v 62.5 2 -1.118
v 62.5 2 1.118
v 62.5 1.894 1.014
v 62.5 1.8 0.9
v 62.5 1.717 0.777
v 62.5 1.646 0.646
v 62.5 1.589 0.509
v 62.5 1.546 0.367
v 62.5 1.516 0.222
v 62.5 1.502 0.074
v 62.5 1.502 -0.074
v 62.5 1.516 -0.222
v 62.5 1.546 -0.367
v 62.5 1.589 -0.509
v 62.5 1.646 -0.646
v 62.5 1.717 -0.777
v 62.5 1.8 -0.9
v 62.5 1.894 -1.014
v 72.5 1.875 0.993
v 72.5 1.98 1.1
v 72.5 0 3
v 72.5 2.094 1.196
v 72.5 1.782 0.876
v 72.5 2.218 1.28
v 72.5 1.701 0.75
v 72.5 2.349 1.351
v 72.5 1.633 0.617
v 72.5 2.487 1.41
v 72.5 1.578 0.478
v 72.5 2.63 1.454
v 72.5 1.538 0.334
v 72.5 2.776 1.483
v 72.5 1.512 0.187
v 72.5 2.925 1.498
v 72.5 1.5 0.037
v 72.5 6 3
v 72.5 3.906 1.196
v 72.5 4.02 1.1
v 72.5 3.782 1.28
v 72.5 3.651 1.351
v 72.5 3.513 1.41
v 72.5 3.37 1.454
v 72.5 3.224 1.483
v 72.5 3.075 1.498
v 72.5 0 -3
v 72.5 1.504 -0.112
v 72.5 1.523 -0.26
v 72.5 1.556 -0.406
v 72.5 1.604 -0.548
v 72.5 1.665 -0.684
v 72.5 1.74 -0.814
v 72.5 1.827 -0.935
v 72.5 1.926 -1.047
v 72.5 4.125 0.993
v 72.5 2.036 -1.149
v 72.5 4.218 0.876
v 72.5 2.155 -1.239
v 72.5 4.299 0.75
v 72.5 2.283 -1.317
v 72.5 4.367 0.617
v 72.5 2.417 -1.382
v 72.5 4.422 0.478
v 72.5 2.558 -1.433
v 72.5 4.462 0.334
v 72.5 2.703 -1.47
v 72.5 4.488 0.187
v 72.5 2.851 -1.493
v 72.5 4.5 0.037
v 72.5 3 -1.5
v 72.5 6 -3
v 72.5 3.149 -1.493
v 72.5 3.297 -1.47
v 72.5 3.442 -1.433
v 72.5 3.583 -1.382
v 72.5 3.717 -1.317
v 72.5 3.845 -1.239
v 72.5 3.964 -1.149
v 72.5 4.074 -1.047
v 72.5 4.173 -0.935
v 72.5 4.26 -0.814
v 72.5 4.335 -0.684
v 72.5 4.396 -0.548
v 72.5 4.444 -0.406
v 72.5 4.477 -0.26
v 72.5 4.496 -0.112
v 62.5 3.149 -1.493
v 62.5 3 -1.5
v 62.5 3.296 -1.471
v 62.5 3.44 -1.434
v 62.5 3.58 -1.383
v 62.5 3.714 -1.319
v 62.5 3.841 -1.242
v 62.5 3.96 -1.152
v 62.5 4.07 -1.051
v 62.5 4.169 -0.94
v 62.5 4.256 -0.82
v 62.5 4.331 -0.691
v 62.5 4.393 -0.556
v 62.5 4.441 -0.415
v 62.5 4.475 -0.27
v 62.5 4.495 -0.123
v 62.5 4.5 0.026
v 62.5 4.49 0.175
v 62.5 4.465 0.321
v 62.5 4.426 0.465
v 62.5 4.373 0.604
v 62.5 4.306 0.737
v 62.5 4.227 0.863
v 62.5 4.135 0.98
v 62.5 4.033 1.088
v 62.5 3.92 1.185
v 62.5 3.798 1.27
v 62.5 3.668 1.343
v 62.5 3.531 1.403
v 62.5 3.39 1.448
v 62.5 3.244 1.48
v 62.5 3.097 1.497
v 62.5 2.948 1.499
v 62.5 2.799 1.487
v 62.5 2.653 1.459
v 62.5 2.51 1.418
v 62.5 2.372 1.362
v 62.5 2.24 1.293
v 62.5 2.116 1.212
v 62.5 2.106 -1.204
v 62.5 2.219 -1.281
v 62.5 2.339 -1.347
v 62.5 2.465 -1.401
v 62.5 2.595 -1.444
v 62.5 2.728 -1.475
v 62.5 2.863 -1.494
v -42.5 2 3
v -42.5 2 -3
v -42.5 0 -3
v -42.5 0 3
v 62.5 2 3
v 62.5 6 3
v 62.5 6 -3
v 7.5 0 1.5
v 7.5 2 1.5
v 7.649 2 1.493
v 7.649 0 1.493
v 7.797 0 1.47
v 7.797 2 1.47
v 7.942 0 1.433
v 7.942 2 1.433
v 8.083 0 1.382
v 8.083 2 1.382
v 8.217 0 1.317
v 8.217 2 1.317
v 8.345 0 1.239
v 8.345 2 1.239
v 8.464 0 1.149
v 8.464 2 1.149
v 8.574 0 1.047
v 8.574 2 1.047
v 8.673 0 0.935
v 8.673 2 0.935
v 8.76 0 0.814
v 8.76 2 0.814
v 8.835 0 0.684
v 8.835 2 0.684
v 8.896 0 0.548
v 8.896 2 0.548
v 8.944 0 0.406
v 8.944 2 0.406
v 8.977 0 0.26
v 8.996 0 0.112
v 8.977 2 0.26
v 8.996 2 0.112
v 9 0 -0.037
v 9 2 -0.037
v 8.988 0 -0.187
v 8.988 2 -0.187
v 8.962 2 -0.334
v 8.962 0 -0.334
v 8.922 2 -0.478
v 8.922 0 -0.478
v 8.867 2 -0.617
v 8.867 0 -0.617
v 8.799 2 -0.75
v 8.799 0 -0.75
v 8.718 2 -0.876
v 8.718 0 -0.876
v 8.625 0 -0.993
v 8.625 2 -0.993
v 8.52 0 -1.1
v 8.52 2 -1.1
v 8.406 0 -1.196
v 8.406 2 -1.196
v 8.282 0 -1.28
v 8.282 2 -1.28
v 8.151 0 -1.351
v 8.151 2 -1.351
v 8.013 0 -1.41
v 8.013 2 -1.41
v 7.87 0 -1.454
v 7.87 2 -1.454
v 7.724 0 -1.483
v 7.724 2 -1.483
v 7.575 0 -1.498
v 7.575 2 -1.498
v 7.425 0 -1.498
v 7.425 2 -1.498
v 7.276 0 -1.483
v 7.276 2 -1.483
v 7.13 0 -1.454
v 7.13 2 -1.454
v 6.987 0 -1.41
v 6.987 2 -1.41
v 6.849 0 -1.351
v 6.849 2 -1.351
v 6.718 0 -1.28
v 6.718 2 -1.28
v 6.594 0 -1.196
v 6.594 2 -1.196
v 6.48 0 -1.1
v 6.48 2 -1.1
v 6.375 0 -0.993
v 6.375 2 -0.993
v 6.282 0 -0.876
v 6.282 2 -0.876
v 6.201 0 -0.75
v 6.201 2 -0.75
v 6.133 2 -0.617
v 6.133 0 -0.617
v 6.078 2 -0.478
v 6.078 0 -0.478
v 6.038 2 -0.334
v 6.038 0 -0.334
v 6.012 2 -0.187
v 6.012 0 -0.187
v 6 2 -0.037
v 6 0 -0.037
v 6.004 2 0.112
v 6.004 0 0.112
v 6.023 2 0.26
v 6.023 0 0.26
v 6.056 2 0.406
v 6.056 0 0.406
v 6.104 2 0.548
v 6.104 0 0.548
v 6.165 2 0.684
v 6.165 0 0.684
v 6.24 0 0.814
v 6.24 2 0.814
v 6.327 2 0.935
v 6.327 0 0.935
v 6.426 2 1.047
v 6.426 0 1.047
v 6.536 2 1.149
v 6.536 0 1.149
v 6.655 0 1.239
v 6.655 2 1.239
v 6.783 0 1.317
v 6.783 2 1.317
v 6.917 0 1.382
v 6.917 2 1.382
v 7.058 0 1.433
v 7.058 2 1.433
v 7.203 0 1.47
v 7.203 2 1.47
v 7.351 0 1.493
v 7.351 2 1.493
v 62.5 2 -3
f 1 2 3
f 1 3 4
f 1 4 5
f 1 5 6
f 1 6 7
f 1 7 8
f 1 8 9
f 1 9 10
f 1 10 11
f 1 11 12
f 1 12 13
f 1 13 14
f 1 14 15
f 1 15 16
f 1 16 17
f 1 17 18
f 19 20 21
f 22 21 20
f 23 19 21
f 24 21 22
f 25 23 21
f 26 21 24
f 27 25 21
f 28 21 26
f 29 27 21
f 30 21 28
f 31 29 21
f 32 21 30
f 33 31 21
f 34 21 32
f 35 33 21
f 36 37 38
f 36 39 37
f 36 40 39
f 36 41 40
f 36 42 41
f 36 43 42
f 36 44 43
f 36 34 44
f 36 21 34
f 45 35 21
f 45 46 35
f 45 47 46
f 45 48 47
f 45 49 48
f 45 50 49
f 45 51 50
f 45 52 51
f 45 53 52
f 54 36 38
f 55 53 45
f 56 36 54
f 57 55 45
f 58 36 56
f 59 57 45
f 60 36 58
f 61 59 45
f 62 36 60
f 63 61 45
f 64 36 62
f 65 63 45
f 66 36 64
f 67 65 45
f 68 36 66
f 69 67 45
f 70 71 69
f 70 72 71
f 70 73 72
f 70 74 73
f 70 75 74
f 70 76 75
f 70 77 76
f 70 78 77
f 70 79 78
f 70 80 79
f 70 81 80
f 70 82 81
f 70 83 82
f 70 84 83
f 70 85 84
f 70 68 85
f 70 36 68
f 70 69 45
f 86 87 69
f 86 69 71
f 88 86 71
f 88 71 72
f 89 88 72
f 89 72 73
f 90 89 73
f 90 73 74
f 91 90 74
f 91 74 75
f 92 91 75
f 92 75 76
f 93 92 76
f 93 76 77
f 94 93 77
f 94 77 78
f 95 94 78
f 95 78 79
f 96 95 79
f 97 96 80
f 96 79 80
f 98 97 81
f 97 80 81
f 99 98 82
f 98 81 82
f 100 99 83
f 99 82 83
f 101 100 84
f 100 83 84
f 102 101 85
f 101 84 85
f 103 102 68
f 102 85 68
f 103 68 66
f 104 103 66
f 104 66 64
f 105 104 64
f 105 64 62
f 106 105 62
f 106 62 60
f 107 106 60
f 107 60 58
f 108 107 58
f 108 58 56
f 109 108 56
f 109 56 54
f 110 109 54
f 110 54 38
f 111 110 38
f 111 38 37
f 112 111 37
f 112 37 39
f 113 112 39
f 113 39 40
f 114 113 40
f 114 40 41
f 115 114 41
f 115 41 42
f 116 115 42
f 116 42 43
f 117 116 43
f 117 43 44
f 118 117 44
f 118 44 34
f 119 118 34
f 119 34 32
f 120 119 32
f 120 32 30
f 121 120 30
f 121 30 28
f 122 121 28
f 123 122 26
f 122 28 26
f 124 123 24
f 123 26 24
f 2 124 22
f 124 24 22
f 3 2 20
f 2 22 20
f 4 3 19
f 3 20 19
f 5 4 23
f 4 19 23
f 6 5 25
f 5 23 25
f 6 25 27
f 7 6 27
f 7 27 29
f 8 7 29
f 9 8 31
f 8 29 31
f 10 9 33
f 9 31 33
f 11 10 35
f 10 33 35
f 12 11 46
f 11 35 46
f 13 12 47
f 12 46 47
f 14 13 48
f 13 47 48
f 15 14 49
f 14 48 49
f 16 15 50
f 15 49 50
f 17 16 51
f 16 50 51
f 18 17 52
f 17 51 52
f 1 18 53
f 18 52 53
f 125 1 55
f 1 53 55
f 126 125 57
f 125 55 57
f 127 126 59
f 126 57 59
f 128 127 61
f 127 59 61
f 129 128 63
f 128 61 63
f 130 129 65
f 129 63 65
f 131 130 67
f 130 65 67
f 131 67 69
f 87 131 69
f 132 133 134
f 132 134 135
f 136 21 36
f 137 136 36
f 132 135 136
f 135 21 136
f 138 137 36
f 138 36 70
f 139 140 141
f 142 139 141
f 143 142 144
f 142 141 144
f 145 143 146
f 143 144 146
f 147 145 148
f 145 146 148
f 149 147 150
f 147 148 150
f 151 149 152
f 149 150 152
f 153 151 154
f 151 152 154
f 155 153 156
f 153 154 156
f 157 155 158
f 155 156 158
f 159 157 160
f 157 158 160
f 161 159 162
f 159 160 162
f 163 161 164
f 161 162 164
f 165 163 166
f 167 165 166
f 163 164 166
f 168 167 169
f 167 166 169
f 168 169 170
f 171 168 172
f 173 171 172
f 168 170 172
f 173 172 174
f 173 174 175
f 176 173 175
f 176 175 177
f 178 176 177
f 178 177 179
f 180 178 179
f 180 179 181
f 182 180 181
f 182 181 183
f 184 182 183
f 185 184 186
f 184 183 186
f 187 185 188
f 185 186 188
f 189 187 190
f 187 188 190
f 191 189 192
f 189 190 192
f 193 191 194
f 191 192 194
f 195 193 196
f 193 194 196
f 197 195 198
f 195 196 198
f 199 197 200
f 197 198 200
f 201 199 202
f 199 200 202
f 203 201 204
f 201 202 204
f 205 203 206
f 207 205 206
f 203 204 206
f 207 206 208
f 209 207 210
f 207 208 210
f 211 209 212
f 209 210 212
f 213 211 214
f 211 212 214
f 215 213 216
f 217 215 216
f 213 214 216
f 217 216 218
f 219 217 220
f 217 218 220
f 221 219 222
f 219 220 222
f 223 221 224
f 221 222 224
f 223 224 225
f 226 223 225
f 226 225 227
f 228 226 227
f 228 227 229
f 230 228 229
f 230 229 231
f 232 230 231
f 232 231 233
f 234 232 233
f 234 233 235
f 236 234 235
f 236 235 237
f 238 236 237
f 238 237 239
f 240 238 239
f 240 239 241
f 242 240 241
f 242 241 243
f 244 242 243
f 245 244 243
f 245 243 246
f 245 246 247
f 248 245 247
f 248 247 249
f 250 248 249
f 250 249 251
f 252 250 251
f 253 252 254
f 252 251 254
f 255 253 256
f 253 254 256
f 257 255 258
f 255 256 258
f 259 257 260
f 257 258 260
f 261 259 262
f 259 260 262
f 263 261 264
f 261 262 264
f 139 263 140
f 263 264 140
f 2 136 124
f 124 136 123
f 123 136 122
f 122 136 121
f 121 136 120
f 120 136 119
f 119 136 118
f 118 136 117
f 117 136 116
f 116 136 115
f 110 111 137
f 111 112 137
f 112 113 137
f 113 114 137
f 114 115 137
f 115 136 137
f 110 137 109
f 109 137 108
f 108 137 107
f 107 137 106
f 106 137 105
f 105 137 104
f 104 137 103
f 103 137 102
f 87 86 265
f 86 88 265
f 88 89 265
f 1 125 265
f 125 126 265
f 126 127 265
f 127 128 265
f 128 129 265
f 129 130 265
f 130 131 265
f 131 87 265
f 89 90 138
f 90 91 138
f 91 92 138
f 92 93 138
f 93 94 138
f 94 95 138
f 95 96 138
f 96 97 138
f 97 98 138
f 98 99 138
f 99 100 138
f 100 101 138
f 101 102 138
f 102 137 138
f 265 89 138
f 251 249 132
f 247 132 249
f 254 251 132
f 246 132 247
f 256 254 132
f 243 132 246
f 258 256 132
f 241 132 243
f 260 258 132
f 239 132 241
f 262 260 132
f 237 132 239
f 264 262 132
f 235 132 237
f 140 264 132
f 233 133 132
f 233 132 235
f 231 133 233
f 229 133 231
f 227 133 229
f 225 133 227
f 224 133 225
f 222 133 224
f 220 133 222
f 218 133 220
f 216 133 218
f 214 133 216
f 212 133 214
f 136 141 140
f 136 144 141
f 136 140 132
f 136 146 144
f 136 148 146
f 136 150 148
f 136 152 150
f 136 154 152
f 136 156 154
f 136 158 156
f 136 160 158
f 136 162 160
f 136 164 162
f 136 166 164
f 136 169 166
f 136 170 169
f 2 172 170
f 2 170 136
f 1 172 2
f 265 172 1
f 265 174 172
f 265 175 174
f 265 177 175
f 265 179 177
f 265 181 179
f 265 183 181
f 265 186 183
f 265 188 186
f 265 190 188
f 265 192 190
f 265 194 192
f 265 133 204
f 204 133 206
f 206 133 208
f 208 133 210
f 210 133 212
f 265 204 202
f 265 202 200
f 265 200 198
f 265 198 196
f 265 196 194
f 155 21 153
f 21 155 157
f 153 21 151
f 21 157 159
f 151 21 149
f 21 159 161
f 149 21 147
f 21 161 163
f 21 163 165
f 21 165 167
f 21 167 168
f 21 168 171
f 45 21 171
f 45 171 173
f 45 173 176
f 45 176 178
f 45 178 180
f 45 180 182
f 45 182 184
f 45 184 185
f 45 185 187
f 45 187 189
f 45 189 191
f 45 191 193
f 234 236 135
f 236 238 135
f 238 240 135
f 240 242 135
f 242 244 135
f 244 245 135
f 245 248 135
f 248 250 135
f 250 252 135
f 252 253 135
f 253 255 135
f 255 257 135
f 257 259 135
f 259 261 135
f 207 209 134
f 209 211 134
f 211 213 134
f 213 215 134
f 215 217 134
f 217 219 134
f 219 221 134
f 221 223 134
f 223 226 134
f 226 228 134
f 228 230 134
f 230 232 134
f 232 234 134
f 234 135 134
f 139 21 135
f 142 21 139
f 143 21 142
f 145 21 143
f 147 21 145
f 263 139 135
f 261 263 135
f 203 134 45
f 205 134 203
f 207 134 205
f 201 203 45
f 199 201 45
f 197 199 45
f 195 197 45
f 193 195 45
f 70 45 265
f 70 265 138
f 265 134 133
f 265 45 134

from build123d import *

# Parameters (mm, degrees)
SKETCH1_W           = 125
SKETCH1_H           = 6
BOSS_EXTRUDE1_DEPTH = 4
SKETCH2_R           = 1.15
CUT_EXTRUDE1_DEPTH  = 4
SKETCH4_W           = 6
SKETCH4_H           = 6
BOSS_EXTRUDE2_DEPTH = 10
SKETCH5_R           = 1.25
CUT_EXTRUDE2_DEPTH  = 10
SKETCH6_W           = 125
SKETCH6_H           = 6
CUT_EXTRUDE3_DEPTH  = 2
SKETCH7_R           = 1.5
CUT_EXTRUDE5_DEPTH  = 2
SKETCH8_R           = 1.5
CUT_EXTRUDE6_DEPTH  = 10
SKETCH9_R           = 1.5
CUT_EXTRUDE7_DEPTH  = 10
SKETCH10_W          = 6
SKETCH10_H          = 2
CUT_EXTRUDE8_DEPTH  = 20
SKETCH11_R          = 1.5
BOSS_EXTRUDE3_DEPTH = 2
SKETCH12_R          = 1.5
CUT_EXTRUDE9_DEPTH  = 2


with BuildPart() as part:
    # Sketch1 → Boss-Extrude1 (new body)
    with BuildSketch(Plane(origin=(0, 0, 0), x_dir=(1, 0, 0), z_dir=(0, 1, 0))):
        Rectangle(SKETCH1_W, SKETCH1_H)
    extrude(amount=BOSS_EXTRUDE1_DEPTH)

    # Sketch2 → Cut-Extrude1 (cut)
    with BuildSketch(Plane.XZ):
        with Locations(Location((0, 0, 0), (0, 0, 270))):
            Circle(SKETCH2_R)
    extrude(amount=-CUT_EXTRUDE1_DEPTH, mode=Mode.SUBTRACT)

    # Sketch4 → Boss-Extrude2 (add)
    with BuildSketch(Plane(origin=(62.5, 0, 0), x_dir=(0, 0, -1), z_dir=(1, 0, 0))):
        with Locations((0, 3)):
            Rectangle(SKETCH4_W, SKETCH4_H)
    extrude(amount=BOSS_EXTRUDE2_DEPTH)

    # Sketch5 → Cut-Extrude2 (cut)
    with BuildSketch(Plane(origin=(72.5, 0, 0), x_dir=(0, 0, -1), z_dir=(1, 0, 0))):
        with Locations((0, 3)):
            Circle(SKETCH5_R)
    extrude(amount=-CUT_EXTRUDE2_DEPTH, mode=Mode.SUBTRACT)

    # Sketch6 → Cut-Extrude3 (cut)
    with BuildSketch(Plane(origin=(0, 4, 0), x_dir=(1, 0, 0), z_dir=(0, 1, 0))):
        Rectangle(SKETCH6_W, SKETCH6_H)
    extrude(amount=-CUT_EXTRUDE3_DEPTH, mode=Mode.SUBTRACT)

    # Sketch7 → Cut-Extrude5 (cut)
    with BuildSketch(Plane(origin=(0, 2, 0), x_dir=(1, 0, 0), z_dir=(0, 1, 0))):
        with Locations(Location((0, 0, 0), (0, 0, 270))):
            Circle(SKETCH7_R)
    extrude(amount=-CUT_EXTRUDE5_DEPTH, mode=Mode.SUBTRACT)

    # Sketch8 → Cut-Extrude6 (cut)
    with BuildSketch(Plane(origin=(72.5, 0, 0), x_dir=(0, 0, -1), z_dir=(1, 0, 0))):
        with Locations((0, 3)):
            Circle(SKETCH8_R)
    extrude(amount=-CUT_EXTRUDE6_DEPTH, mode=Mode.SUBTRACT)

    # Sketch9 → Cut-Extrude7 (cut)
    with BuildSketch(Plane(origin=(0, 2, 0), x_dir=(1, 0, 0), z_dir=(0, 1, 0))):
        with Locations(Location((-57.5, 0, 0), (0, 0, 270))):
            Circle(SKETCH9_R)
    extrude(amount=-CUT_EXTRUDE7_DEPTH, mode=Mode.SUBTRACT)

    # Sketch10 → Cut-Extrude8 (cut)
    with BuildSketch(Plane.ZY.offset(62.5)):
        with Locations((0, 1)):
            Rectangle(SKETCH10_W, SKETCH10_H)
    extrude(amount=-CUT_EXTRUDE8_DEPTH, mode=Mode.SUBTRACT)

    # Sketch11 → Boss-Extrude3 (add)
    with BuildSketch(Plane(origin=(0, 2, 0), x_dir=(1, 0, 0), z_dir=(0, 1, 0))):
        Circle(SKETCH11_R)
    extrude(amount=-BOSS_EXTRUDE3_DEPTH)

    # Sketch12 → Cut-Extrude9 (cut)
    with BuildSketch(Plane(origin=(0, 2, 0), x_dir=(1, 0, 0), z_dir=(0, 1, 0))):
        with Locations(Location((7.5, 0, 0), (0, 0, 270))):
            Circle(SKETCH12_R)
    extrude(amount=-CUT_EXTRUDE9_DEPTH, mode=Mode.SUBTRACT)


solid = part.part
